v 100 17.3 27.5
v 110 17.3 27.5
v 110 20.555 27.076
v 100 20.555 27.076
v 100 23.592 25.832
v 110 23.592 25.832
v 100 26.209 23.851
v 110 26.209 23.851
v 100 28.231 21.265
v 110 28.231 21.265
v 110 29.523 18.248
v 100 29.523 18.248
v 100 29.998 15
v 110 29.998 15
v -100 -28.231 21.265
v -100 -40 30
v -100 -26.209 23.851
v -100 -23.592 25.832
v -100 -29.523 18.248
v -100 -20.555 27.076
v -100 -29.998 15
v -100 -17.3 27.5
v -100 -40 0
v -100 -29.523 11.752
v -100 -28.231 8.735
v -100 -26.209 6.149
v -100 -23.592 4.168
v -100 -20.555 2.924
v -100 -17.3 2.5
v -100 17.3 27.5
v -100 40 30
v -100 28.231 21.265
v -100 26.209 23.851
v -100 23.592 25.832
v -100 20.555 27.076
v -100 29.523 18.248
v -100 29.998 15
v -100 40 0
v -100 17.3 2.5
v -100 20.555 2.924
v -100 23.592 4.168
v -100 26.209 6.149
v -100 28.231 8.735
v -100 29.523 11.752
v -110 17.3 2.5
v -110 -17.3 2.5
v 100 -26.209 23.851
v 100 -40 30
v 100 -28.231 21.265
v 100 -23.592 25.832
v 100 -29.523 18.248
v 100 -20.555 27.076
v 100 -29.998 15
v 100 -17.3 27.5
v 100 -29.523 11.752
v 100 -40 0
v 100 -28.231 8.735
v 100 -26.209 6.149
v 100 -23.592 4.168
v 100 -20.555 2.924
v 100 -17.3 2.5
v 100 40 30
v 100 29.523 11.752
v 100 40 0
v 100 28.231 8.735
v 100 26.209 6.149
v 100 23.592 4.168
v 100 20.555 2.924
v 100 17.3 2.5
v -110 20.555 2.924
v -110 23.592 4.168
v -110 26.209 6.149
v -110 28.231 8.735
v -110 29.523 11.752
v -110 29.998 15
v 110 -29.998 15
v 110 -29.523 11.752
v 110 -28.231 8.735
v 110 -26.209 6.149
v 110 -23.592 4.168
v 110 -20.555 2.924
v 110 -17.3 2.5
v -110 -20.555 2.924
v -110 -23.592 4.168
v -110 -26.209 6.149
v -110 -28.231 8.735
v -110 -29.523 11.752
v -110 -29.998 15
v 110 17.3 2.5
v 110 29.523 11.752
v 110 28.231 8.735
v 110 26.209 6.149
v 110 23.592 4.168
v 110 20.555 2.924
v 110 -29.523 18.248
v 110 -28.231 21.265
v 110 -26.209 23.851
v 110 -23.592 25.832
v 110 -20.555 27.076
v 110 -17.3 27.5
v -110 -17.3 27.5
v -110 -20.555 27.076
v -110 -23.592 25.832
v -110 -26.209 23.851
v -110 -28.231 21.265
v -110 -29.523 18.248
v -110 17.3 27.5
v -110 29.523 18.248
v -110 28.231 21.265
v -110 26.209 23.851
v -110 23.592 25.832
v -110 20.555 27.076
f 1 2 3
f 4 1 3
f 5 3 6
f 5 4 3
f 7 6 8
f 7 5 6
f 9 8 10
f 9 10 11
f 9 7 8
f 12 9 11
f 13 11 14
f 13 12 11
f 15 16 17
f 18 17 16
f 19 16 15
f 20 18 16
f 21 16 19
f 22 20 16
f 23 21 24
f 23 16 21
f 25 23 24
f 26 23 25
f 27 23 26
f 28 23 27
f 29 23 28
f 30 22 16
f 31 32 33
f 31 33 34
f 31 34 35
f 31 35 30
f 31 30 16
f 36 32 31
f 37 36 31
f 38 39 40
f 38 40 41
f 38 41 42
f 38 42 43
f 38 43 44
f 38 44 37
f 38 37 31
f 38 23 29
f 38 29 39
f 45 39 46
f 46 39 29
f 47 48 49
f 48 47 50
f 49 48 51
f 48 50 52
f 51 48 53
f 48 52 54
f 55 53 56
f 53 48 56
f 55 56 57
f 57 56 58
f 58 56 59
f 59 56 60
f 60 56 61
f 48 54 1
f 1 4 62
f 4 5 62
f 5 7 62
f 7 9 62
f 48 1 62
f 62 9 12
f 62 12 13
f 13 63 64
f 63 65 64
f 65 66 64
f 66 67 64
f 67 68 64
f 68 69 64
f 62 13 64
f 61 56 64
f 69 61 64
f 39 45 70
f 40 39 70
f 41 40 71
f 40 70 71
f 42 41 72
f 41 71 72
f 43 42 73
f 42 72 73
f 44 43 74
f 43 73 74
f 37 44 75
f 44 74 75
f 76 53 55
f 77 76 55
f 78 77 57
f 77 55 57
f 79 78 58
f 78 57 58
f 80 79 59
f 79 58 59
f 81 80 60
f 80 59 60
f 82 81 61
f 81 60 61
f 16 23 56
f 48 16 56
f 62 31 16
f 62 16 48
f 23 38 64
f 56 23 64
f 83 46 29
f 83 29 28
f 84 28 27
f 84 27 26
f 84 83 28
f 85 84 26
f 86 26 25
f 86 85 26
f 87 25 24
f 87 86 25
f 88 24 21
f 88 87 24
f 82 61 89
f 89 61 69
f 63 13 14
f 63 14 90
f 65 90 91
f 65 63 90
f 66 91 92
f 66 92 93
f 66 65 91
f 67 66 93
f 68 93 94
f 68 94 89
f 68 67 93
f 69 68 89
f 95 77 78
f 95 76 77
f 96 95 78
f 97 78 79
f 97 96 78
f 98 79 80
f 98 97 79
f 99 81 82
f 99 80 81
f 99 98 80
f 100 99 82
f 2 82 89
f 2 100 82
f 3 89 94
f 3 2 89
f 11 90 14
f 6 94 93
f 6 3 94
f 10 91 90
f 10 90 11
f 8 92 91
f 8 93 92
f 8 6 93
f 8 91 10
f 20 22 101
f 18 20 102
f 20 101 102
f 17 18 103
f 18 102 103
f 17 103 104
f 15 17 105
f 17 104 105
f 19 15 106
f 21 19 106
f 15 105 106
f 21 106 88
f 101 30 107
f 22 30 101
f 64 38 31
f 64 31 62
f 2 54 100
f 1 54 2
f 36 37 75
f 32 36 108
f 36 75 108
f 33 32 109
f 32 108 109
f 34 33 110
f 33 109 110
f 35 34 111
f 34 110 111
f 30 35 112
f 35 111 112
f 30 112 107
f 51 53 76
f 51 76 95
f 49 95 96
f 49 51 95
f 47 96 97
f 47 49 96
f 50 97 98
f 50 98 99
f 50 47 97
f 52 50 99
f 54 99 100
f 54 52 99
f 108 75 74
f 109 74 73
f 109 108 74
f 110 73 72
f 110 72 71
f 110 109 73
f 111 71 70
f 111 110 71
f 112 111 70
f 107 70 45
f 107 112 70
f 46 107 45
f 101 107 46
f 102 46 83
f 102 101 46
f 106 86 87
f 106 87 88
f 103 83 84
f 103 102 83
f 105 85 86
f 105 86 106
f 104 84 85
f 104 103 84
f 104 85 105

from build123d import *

# Parameters (mm, degrees)
F0_W        = 200
F0_H        = 80
F1_DEPTH    = 30
F2_W        = 60
F2_H        = 25
F3_DEPTH    = 10
F4_W        = 60
F4_H        = 25
F5_DEPTH    = 10
F6_T1_DEPTH = 41.75
F6_T3_DEPTH = 41.75


# Not quite as in the source:
# - a fillet or chamfer that OpenCascade refuses, or shapes differently, is made with other operations: its cross-section is extruded or revolved along the edge and cut away or added


with BuildPart() as f1:
    # F0 (on Top) → F1 (new body)
    with BuildSketch(Plane.XY):
        Rectangle(F0_W, F0_H)
    extrude(amount=F1_DEPTH)

    # F2 (on face) → F3 (join)
    with BuildSketch(Plane(origin=(-100, 0, 0), x_dir=(0, -1, 0), z_dir=(-1, 0, 0))):
        with Locations((0, 15)):
            Rectangle(F2_W, F2_H)
    extrude(amount=F3_DEPTH)

    # F4 (on face) → F5 (join)
    with BuildSketch(Plane.YZ.offset(100)):
        with Locations((0, 15)):
            Rectangle(F4_W, F4_H)
    extrude(amount=F5_DEPTH)

    # F6: fillet of radius 12.7 on 8 edges, made by hand

    # F6_s2 → F6_t1 (cut)
    with BuildSketch(Plane.YZ.offset(100)):
        with BuildLine():
            ThreePointArc((-30, 14.8), (-26.2802561211, 23.7802561211), (-17.3, 27.5))
            Line((-17.3, 27.5), (-30, 27.5))
            Line((-30, 27.5), (-30, 14.8))
        make_face()
        with BuildLine():
            ThreePointArc((-30, 15.2), (-26.2802561211, 6.2197438789), (-17.3, 2.5))
            Line((-17.3, 2.5), (-30, 2.5))
            Line((-30, 2.5), (-30, 15.2))
        make_face()
        with BuildLine():
            ThreePointArc((17.3, 27.5), (26.2802561211, 23.7802561211), (30, 14.8))
            Line((30, 14.8), (30, 27.5))
            Line((30, 27.5), (17.3, 27.5))
        make_face()
        with BuildLine():
            ThreePointArc((30, 15.2), (26.2802561211, 6.2197438789), (17.3, 2.5))
            Line((17.3, 2.5), (30, 2.5))
            Line((30, 2.5), (30, 15.2))
        make_face()
    extrude(amount=F6_T1_DEPTH, mode=Mode.SUBTRACT)

    # F6_s4 → F6_t3 (cut)
    with BuildSketch(Plane.YZ.offset(-141.75)):
        with BuildLine():
            ThreePointArc((30, 14.8), (26.2802561211, 23.7802561211), (17.3, 27.5))
            Line((17.3, 27.5), (30, 27.5))
            Line((30, 27.5), (30, 14.8))
        make_face()
        with BuildLine():
            ThreePointArc((-17.3, 27.5), (-26.2802561211, 23.7802561211), (-30, 14.8))
            Line((-30, 14.8), (-30, 27.5))
            Line((-30, 27.5), (-17.3, 27.5))
        make_face()
        with BuildLine():
            ThreePointArc((-17.3, 2.5), (-26.2802561211, 6.2197438789), (-30, 15.2))
            Line((-30, 15.2), (-30, 2.5))
            Line((-30, 2.5), (-17.3, 2.5))
        make_face()
        with BuildLine():
            ThreePointArc((17.3, 2.5), (26.2802561211, 6.2197438789), (30, 15.2))
            Line((30, 15.2), (30, 2.5))
            Line((30, 2.5), (17.3, 2.5))
        make_face()
    extrude(amount=F6_T3_DEPTH, mode=Mode.SUBTRACT)


solid = f1.part
